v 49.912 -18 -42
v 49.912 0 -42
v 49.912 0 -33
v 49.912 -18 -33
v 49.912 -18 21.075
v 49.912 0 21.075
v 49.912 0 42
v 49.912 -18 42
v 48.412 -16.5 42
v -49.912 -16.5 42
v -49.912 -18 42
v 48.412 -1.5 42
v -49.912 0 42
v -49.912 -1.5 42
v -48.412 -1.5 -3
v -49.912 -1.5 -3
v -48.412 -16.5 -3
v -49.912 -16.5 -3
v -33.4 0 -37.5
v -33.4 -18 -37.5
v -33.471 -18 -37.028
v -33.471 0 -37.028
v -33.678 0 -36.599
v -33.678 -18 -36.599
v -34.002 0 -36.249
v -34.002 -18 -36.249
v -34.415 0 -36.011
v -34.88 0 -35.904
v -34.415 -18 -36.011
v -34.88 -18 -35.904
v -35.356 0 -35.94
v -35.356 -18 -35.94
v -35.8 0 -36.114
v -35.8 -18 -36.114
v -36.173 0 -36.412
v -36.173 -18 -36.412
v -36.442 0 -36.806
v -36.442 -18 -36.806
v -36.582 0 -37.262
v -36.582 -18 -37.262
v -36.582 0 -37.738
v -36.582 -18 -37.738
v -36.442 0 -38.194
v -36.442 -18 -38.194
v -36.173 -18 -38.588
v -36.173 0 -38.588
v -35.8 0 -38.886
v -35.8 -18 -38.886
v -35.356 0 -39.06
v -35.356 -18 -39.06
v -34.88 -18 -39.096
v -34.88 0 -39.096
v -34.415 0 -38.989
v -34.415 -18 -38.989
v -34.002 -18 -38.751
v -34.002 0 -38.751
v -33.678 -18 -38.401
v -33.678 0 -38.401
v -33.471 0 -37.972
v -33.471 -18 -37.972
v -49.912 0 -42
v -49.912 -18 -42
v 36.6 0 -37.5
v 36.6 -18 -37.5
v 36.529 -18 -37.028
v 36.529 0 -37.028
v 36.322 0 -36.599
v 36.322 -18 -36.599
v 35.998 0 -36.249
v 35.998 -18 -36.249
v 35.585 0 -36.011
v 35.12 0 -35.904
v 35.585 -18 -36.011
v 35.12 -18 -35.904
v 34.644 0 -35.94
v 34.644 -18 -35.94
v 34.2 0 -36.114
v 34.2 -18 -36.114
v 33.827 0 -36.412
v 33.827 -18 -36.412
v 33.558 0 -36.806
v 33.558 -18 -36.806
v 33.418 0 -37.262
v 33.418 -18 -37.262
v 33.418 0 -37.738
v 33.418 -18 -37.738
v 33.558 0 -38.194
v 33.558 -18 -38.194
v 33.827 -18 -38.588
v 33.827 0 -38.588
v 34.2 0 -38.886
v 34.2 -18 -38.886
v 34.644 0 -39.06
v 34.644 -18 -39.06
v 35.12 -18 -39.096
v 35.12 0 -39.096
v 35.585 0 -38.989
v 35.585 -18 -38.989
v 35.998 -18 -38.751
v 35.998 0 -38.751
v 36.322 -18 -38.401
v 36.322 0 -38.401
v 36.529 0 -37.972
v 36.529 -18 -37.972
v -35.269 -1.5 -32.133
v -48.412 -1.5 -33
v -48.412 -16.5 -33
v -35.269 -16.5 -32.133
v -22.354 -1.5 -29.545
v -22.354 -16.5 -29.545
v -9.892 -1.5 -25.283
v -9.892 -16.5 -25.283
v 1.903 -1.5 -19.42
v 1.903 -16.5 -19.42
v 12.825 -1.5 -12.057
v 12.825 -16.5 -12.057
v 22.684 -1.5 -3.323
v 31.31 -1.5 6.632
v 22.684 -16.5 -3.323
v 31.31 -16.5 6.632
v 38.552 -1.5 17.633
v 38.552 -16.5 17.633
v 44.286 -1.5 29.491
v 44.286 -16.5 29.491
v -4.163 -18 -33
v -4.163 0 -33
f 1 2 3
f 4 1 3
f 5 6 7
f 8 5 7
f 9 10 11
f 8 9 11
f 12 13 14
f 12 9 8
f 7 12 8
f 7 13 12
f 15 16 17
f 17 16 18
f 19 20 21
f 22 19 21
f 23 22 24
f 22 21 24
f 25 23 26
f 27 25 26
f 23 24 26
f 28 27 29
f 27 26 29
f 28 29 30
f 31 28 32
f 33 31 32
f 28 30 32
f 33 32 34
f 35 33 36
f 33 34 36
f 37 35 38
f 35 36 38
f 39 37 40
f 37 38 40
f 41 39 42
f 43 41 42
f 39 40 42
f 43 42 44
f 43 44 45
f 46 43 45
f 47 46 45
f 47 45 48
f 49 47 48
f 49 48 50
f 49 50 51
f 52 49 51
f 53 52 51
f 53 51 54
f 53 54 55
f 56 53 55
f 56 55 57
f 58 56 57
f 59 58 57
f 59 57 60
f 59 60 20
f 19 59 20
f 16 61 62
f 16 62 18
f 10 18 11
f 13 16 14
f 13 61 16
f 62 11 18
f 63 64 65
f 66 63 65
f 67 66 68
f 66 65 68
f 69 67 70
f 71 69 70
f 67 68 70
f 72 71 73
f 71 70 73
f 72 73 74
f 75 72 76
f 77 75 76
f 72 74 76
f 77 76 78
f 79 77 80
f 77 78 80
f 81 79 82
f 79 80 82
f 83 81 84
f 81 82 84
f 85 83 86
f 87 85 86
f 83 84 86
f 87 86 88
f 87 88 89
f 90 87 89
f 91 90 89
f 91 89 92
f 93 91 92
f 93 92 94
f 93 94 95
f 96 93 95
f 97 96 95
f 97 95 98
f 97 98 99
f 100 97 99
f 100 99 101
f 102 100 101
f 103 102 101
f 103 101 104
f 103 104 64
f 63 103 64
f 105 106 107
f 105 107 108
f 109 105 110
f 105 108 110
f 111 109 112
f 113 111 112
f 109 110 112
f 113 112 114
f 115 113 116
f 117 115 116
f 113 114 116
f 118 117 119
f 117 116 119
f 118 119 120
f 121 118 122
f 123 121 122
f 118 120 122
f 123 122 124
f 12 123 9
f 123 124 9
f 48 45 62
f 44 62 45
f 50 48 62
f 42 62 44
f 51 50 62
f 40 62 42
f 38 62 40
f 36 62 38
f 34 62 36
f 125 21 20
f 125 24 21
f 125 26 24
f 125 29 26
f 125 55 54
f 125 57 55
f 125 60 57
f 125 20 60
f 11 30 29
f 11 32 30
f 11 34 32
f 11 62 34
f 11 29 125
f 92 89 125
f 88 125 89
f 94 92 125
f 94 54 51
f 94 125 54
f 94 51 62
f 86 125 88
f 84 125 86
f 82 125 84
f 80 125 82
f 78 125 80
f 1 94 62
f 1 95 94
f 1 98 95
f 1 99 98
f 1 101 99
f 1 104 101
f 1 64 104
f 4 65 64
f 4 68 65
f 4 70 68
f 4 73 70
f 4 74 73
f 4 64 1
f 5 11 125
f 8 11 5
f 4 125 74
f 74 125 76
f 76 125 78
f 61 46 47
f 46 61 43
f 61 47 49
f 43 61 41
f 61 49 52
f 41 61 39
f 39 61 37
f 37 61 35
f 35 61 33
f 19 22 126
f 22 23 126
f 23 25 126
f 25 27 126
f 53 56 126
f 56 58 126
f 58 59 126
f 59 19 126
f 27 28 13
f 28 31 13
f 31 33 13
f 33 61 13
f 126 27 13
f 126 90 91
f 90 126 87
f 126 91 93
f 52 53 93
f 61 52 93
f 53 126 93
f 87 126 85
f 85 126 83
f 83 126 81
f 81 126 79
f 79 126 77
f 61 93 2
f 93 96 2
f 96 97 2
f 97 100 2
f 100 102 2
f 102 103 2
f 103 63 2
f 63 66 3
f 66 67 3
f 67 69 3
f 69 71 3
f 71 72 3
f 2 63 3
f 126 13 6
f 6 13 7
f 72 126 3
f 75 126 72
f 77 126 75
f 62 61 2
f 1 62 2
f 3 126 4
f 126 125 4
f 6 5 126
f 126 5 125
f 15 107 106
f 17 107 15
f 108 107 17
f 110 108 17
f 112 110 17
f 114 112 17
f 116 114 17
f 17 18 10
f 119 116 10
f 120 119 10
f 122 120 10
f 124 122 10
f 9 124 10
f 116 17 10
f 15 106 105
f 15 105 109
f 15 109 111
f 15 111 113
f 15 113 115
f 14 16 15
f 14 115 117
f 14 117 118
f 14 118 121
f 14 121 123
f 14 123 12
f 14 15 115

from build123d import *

# Parameters (mm, degrees)
SKETCH_W        = 99.825
SKETCH_H        = 84
PAD_DEPTH       = 9
POCKET_DEPTH    = 7.5
POCKET001_DEPTH = 9
SKETCH003_R     = 1.6
POCKET002_DEPTH = 20
SKETCH006_W     = 15
SKETCH006_H     = 45
POCKET003_DEPTH = 5


with BuildPart() as pocket001:
    # Sketch → Pad (new body)
    with BuildSketch(Plane.XZ):
        Rectangle(SKETCH_W, SKETCH_H)
    extrude(amount=PAD_DEPTH)

    # Sketch001 → Pocket (cut)
    with BuildSketch(Plane.XZ.offset(9)):
        with BuildLine():
            Line((-48.4125, -33), (-48.4125, 42))
            Line((-48.4125, 42), (48.412084, 42))
            ThreePointArc((-48.4125, -33), (12.824744, -12.056942), (48.412084, 42))
        make_face()
    extrude(amount=-POCKET_DEPTH, mode=Mode.SUBTRACT)

    # Sketch002 → Pocket001 (cut)
    with BuildSketch(Plane.XZ.offset(9)):
        Polygon((-4.162717, -33), (49.9125, -33), (49.9125, 21.075217), align=None)
    extrude(amount=-POCKET001_DEPTH, mode=Mode.SUBTRACT)


with BuildPart() as pocket003:
    # Part__Mirroring: instance of Pocket001
    add(pocket001.part.mirror(Plane(origin=(0, 0, 0), x_dir=(1, 0, 0), z_dir=(0, 1, 0))))


with BuildPart() as pocket003_1:
    # Part__Mirroring placement: moved
    add(pocket003.part.moved(Location((0, -18, 0))))

    # Fusion: union Pocket001
    add(pocket001.part)

    # Sketch003 → Pocket002 (cut)
    with BuildSketch(Plane.XZ.offset(18)):
        with Locations((-35, -37.5)):
            Circle(SKETCH003_R)
        with Locations((35, -37.5)):
            Circle(SKETCH003_R)
    extrude(amount=-POCKET002_DEPTH, mode=Mode.SUBTRACT)

    # Sketch006 → Pocket003 (cut)
    with BuildSketch(Plane(origin=(-49.9125, 0, 0), x_dir=(0, -1, 0), z_dir=(-1, 0, 0))):
        with Locations((9, 19.5)):
            Rectangle(SKETCH006_W, SKETCH006_H)
    extrude(amount=-POCKET003_DEPTH, mode=Mode.SUBTRACT)


solid = pocket003_1.part
